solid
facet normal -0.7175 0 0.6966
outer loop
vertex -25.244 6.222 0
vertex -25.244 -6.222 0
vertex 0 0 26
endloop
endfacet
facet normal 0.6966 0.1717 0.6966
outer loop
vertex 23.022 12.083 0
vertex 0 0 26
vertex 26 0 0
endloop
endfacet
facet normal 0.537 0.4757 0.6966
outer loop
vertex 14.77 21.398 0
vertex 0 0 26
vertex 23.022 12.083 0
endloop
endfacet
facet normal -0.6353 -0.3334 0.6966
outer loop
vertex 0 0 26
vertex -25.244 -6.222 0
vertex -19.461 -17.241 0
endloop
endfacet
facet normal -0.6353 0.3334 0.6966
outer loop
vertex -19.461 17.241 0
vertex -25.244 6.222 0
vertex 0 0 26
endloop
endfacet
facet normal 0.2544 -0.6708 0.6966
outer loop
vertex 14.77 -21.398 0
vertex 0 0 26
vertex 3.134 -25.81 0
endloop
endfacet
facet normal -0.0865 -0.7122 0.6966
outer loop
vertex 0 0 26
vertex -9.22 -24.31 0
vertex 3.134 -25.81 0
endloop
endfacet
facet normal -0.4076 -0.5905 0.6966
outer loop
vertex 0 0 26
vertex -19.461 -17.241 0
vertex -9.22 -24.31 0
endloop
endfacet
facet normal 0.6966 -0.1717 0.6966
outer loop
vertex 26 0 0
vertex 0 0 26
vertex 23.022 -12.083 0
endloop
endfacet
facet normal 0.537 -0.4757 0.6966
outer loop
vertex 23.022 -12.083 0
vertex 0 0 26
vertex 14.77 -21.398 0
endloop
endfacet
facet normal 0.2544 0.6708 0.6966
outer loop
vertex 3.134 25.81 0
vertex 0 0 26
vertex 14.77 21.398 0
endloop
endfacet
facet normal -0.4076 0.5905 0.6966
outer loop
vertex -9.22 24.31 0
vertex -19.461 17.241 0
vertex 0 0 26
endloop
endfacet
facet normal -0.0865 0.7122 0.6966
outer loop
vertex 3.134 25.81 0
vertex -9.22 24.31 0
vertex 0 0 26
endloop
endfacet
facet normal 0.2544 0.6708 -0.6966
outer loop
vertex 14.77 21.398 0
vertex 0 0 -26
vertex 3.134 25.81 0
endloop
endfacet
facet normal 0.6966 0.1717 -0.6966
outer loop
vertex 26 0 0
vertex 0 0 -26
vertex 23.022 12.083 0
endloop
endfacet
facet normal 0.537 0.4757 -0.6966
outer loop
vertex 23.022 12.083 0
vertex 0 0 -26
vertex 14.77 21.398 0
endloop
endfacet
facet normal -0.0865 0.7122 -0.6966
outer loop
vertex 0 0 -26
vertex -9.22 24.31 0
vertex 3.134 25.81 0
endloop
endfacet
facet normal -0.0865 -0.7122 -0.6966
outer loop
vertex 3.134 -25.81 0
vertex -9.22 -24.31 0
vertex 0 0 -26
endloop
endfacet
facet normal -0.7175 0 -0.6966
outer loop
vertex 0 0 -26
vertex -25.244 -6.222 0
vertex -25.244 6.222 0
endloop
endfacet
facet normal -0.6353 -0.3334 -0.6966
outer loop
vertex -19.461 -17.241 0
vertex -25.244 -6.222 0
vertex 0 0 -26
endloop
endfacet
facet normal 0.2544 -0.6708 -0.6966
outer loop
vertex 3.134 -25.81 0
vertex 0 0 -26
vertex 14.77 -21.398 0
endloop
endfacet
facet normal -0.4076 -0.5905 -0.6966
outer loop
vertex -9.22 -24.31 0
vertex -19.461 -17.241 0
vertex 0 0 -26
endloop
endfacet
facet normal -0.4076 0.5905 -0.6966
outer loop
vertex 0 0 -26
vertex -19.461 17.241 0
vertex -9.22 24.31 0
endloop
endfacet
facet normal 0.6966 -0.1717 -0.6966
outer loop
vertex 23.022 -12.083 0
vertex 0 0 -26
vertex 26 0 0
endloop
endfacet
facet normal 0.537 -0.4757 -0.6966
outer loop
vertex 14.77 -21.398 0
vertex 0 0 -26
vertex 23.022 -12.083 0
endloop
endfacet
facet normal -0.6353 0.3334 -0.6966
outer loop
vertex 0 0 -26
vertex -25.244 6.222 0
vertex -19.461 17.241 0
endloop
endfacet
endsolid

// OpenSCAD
numberOfSides=26;
linear_extrude(scale=0,height=numberOfSides) circle(numberOfSides,$fn=numberOfSides/2);
mirror([0,0,1]) linear_extrude(scale=0,height=numberOfSides) circle(numberOfSides,$fn=numberOfSides/2);
